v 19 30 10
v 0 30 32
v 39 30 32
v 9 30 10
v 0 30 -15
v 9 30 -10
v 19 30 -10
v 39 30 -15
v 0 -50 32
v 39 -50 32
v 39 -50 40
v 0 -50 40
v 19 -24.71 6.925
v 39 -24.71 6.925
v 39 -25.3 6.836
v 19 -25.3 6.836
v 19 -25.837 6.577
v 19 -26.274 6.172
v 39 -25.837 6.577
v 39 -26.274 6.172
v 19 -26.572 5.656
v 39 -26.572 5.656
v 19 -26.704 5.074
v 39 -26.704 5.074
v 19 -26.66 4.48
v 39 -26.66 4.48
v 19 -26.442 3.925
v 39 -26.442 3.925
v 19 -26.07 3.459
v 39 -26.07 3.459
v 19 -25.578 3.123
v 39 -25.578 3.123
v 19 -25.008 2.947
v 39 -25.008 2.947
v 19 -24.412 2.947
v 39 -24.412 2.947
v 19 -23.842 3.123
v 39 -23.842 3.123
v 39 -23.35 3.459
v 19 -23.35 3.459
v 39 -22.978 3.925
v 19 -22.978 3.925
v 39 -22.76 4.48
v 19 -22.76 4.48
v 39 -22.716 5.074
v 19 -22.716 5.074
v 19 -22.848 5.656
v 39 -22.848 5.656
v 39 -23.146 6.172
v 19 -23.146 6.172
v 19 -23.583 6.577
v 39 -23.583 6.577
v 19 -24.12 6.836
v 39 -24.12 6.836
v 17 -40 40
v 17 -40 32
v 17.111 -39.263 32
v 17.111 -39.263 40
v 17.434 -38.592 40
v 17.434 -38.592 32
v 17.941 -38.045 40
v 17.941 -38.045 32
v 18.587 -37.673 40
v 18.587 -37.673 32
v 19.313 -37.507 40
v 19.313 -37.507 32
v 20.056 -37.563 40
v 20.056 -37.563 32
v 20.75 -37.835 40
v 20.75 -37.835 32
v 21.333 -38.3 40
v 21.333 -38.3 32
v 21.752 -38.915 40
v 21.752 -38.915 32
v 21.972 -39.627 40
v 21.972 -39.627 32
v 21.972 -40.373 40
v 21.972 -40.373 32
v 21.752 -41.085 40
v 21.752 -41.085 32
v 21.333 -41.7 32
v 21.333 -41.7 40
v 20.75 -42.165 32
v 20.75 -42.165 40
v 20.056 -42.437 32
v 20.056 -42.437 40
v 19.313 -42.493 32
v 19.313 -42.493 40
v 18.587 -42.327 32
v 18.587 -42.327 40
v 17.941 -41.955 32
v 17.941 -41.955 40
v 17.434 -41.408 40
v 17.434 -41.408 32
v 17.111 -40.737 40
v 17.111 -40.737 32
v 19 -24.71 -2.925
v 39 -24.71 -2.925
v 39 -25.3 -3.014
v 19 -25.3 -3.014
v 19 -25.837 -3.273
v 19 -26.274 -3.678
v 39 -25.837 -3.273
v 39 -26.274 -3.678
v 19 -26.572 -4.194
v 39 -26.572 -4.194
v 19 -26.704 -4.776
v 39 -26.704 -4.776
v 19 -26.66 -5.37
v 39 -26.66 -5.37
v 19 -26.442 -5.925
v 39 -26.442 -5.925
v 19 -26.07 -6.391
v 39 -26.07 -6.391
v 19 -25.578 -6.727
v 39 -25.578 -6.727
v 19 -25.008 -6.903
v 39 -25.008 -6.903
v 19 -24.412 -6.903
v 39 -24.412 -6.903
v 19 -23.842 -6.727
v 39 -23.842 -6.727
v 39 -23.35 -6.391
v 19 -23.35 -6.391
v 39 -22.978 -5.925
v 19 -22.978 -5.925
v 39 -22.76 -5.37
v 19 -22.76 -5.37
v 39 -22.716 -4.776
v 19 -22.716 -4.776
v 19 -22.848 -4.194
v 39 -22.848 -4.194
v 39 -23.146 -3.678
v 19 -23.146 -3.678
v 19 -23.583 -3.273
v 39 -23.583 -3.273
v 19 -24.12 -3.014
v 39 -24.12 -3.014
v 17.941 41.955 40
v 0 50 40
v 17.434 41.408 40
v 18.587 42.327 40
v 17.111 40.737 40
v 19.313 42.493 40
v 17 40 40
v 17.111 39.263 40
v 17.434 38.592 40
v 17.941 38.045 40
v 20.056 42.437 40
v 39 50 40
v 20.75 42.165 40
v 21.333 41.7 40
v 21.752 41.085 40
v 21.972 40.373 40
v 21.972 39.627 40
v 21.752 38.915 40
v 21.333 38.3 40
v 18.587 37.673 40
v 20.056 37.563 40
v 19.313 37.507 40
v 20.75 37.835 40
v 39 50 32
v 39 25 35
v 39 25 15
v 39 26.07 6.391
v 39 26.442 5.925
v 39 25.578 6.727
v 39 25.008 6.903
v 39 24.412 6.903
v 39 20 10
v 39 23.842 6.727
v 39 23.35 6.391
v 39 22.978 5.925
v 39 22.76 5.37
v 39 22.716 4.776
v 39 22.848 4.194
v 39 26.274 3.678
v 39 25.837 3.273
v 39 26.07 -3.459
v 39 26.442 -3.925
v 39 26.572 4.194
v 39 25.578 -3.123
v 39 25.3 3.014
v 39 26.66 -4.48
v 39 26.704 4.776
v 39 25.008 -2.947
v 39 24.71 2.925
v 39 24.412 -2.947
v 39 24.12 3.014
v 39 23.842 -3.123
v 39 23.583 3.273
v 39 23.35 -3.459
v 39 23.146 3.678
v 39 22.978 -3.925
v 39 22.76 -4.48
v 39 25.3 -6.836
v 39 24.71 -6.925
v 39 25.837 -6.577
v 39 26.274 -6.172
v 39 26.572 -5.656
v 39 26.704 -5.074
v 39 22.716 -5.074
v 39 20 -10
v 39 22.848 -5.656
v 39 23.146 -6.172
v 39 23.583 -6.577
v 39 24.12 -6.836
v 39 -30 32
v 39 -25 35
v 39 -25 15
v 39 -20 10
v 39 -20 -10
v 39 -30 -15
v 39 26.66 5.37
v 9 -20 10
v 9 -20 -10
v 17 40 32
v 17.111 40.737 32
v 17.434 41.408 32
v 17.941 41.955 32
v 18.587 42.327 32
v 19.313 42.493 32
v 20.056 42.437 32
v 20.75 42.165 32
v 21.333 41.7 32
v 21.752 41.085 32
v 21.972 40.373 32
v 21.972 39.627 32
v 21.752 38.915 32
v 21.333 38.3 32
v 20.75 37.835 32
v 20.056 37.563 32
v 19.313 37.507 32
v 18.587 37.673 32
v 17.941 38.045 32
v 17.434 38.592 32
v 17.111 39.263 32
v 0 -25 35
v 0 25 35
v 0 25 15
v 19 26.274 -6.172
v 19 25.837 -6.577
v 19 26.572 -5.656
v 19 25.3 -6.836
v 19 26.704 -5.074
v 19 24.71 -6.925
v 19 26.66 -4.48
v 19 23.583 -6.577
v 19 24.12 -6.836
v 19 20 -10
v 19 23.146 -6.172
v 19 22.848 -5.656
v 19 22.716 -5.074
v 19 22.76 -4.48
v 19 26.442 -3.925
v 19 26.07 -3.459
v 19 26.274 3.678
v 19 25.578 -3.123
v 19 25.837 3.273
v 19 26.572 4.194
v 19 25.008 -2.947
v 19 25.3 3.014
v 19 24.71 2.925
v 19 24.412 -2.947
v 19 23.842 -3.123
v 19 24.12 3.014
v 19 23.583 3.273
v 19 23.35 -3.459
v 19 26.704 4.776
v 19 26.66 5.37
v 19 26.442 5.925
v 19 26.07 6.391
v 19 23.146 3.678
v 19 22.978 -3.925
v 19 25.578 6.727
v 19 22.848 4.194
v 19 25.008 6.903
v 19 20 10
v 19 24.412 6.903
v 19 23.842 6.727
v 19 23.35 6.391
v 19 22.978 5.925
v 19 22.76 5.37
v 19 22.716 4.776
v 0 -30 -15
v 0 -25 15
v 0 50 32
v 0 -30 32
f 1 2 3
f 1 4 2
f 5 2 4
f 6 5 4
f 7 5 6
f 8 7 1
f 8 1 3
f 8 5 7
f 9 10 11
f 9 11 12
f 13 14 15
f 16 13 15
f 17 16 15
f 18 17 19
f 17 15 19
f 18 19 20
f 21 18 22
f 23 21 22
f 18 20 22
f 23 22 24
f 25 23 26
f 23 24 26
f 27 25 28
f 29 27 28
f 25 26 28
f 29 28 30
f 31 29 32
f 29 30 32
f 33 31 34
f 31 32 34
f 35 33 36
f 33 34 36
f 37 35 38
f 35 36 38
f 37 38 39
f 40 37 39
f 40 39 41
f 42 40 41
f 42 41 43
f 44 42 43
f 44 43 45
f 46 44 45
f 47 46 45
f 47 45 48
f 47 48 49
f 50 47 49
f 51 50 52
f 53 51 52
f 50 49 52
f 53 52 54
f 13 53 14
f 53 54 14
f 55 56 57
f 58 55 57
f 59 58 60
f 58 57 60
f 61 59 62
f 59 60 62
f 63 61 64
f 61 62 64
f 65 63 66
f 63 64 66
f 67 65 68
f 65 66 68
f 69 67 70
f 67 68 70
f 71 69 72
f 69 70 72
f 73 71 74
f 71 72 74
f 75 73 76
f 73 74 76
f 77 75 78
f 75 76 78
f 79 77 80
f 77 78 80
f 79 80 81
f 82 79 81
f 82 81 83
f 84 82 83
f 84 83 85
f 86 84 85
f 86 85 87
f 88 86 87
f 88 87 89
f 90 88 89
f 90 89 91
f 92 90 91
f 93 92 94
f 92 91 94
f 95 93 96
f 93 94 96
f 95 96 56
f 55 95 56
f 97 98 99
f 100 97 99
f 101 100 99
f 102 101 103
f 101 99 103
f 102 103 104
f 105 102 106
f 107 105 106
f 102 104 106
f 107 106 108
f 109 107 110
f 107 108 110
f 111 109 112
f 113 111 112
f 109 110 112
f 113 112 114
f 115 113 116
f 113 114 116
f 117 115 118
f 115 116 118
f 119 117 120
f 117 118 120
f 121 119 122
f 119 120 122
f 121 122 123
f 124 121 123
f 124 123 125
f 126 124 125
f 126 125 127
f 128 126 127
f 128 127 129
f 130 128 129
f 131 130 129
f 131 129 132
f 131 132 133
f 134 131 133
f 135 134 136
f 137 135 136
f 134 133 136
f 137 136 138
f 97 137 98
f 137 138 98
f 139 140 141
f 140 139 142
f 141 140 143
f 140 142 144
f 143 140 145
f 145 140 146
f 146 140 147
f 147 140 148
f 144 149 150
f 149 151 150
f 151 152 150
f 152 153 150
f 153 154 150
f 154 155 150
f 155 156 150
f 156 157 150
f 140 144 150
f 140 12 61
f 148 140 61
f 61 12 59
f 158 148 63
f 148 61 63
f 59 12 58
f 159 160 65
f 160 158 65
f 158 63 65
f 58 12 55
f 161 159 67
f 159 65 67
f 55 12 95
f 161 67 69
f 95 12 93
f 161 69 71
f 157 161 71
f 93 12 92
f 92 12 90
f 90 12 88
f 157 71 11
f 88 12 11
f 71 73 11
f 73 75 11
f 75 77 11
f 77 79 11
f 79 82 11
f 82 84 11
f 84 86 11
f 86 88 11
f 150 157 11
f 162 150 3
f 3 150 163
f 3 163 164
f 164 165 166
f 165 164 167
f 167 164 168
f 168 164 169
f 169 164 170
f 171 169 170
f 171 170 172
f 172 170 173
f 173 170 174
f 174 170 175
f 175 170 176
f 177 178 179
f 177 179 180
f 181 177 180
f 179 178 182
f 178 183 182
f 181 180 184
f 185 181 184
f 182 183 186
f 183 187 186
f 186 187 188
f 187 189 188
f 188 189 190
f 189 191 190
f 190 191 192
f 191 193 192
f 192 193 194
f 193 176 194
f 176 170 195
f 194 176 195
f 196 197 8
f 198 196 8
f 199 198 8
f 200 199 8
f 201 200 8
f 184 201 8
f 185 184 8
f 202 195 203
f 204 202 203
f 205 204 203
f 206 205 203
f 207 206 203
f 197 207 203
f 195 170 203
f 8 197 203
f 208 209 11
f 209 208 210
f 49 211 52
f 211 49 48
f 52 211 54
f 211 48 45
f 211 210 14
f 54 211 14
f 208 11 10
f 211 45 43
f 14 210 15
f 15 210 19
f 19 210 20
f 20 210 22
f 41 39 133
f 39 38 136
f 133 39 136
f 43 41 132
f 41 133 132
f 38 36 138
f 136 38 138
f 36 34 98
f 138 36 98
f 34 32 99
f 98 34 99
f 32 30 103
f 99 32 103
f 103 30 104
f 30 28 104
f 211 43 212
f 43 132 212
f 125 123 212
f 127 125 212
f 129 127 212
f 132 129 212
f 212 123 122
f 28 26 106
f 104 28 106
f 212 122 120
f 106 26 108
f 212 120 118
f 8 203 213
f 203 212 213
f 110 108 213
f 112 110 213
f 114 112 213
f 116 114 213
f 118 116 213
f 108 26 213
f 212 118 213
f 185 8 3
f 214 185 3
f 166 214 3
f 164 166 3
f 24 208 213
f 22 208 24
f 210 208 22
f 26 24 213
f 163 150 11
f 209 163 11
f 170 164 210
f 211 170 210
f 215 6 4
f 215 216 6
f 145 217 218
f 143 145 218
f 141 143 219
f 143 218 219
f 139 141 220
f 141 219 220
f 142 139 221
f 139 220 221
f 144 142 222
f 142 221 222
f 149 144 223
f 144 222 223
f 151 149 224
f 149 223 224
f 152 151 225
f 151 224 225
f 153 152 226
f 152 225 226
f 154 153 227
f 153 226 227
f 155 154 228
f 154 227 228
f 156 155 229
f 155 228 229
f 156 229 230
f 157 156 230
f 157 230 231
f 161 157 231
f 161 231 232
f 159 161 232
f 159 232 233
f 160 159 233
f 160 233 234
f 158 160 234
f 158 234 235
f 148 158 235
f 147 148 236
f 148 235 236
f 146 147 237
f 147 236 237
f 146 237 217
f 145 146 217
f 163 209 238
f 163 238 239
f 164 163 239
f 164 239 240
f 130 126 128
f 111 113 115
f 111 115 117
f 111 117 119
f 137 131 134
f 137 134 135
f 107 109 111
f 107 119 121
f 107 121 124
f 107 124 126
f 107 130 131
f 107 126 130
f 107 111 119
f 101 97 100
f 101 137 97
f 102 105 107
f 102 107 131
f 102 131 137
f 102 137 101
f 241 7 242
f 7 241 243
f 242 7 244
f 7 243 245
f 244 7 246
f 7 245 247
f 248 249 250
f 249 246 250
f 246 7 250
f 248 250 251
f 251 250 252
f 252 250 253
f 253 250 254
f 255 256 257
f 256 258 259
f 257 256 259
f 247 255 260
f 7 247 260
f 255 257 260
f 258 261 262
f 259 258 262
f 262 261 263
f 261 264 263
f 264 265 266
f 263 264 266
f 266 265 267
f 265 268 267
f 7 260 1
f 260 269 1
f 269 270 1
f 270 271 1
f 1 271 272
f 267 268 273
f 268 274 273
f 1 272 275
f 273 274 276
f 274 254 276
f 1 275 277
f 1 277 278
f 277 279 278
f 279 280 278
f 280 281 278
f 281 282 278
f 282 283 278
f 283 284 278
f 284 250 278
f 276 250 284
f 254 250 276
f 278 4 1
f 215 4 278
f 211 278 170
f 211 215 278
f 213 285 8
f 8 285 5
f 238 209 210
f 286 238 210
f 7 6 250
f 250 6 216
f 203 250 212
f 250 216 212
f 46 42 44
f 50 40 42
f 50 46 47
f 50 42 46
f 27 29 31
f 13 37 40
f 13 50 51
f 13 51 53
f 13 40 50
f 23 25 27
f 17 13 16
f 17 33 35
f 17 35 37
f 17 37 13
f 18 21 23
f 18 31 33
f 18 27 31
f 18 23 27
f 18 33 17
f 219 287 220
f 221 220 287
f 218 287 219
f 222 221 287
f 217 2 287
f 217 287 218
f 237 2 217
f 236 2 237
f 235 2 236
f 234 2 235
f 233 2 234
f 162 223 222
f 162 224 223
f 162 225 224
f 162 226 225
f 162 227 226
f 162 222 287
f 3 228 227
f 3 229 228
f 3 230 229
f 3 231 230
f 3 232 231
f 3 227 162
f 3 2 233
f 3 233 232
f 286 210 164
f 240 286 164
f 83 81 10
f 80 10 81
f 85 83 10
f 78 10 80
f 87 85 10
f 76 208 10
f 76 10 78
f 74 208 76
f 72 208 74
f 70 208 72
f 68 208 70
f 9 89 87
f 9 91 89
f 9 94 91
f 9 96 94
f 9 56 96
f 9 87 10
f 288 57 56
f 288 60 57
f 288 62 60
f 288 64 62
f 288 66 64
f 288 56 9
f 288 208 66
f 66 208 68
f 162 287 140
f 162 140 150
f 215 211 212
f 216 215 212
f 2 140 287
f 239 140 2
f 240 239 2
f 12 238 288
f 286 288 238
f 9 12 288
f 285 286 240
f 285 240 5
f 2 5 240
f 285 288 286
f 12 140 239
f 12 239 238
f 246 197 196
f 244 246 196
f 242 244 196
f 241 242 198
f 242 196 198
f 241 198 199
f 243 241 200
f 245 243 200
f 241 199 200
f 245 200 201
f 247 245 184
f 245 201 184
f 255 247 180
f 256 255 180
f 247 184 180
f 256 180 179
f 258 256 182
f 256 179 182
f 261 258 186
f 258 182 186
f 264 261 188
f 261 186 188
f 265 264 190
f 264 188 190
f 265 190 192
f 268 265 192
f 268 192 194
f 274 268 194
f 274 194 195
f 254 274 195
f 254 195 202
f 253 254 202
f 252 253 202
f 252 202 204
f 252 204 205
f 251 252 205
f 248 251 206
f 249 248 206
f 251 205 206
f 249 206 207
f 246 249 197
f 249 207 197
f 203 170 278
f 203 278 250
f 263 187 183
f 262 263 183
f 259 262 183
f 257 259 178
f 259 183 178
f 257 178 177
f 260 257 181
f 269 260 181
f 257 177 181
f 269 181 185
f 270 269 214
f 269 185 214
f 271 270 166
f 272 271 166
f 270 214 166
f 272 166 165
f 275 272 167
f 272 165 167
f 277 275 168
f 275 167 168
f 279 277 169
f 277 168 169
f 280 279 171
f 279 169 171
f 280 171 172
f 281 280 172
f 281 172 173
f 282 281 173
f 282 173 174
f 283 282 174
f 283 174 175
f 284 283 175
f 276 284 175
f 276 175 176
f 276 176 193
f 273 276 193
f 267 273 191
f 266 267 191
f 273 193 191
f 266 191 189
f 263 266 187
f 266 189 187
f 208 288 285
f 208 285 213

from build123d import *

# Parameters (mm, degrees)
SKETCH1_W           = 30
SKETCH1_H           = 60
BOSS_EXTRUDE1_DEPTH = 39
SKETCH2_W           = 20
SKETCH2_H           = 40
CUT_EXTRUDE1_DEPTH  = 30
SKETCH3_R           = 2
CUT_EXTRUDE2_DEPTH  = 20
SKETCH4_W           = 10
SKETCH4_H           = 20
CUT_EXTRUDE3_DEPTH  = 10
SKETCH5_W           = 39
SKETCH5_H           = 60
BOSS_EXTRUDE2_DEPTH = 25
SKETCH6_W           = 20
SKETCH6_H           = 50
CUT_EXTRUDE4_DEPTH  = 39
SKETCH7_W           = 39
SKETCH7_H           = 8
BOSS_EXTRUDE3_DEPTH = 20
SKETCH8_W           = 39
SKETCH8_H           = 8
BOSS_EXTRUDE4_DEPTH = 20
SKETCH9_R           = 2.5
CUT_EXTRUDE5_DEPTH  = 8


with BuildPart() as part:
    # Sketch1 → Boss-Extrude1 (new body)
    with BuildSketch(Plane(origin=(0, 0, 0), x_dir=(0, 0, -1), z_dir=(1, 0, 0))):
        Rectangle(SKETCH1_W, SKETCH1_H)
    extrude(amount=BOSS_EXTRUDE1_DEPTH)

    # Sketch2 → Cut-Extrude1 (cut)
    with BuildSketch(Plane(origin=(39, 0, 0), x_dir=(0, 0, -1), z_dir=(1, 0, 0))):
        Rectangle(SKETCH2_W, SKETCH2_H)
    extrude(amount=-CUT_EXTRUDE1_DEPTH, mode=Mode.SUBTRACT)

    # Sketch3 → Cut-Extrude2 (cut)
    with BuildSketch(Plane(origin=(39, 0, 0), x_dir=(0, 0, -1), z_dir=(1, 0, 0))):
        with Locations((-4.925, 24.71)):
            Circle(SKETCH3_R)
        with Locations((4.925, 24.71)):
            Circle(SKETCH3_R)
        with Locations(Location((4.925, -24.71, 0), (0, 0, 180))):
            Circle(SKETCH3_R)
        with Locations(Location((-4.925, -24.71, 0), (0, 0, 180))):
            Circle(SKETCH3_R)
    extrude(amount=-CUT_EXTRUDE2_DEPTH, mode=Mode.SUBTRACT)

    # Sketch4 → Cut-Extrude3 (cut)
    with BuildSketch(Plane.XZ.offset(-20)):
        with Locations((14, 0)):
            Rectangle(SKETCH4_W, SKETCH4_H)
    extrude(amount=-CUT_EXTRUDE3_DEPTH, mode=Mode.SUBTRACT)

    # Sketch5 → Boss-Extrude2 (add)
    with BuildSketch(Plane.XY.offset(15)):
        with Locations((19.5, 0)):
            Rectangle(SKETCH5_W, SKETCH5_H)
    extrude(amount=BOSS_EXTRUDE2_DEPTH)

    # Sketch6 → Cut-Extrude4 (cut)
    with BuildSketch(Plane(origin=(39, 0, 0), x_dir=(0, 0, -1), z_dir=(1, 0, 0))):
        with Locations((-25, 0)):
            Rectangle(SKETCH6_W, SKETCH6_H)
    extrude(amount=-CUT_EXTRUDE4_DEPTH, mode=Mode.SUBTRACT)

    # Sketch7 → Boss-Extrude3 (add)
    with BuildSketch(Plane(origin=(0, -30, 0), x_dir=(-1, 0, 0), z_dir=(0, -1, 0))):
        with Locations((-19.5, -36)):
            Rectangle(SKETCH7_W, SKETCH7_H)
    extrude(amount=BOSS_EXTRUDE3_DEPTH)

    # Sketch8 → Boss-Extrude4 (add)
    with BuildSketch(Plane(origin=(0, 30, 0), x_dir=(1, 0, 0), z_dir=(0, 1, 0))):
        with Locations((19.5, -36)):
            Rectangle(SKETCH8_W, SKETCH8_H)
    extrude(amount=BOSS_EXTRUDE4_DEPTH)

    # Sketch9 → Cut-Extrude5 (cut)
    with BuildSketch(Plane(origin=(0, 0, 32), x_dir=(-1, 0, 0), z_dir=(0, 0, -1))):
        with Locations((-19.5, -40)):
            Circle(SKETCH9_R)
        with Locations((-19.5, 40)):
            Circle(SKETCH9_R)
    extrude(amount=-CUT_EXTRUDE5_DEPTH, mode=Mode.SUBTRACT)


solid = part.part
